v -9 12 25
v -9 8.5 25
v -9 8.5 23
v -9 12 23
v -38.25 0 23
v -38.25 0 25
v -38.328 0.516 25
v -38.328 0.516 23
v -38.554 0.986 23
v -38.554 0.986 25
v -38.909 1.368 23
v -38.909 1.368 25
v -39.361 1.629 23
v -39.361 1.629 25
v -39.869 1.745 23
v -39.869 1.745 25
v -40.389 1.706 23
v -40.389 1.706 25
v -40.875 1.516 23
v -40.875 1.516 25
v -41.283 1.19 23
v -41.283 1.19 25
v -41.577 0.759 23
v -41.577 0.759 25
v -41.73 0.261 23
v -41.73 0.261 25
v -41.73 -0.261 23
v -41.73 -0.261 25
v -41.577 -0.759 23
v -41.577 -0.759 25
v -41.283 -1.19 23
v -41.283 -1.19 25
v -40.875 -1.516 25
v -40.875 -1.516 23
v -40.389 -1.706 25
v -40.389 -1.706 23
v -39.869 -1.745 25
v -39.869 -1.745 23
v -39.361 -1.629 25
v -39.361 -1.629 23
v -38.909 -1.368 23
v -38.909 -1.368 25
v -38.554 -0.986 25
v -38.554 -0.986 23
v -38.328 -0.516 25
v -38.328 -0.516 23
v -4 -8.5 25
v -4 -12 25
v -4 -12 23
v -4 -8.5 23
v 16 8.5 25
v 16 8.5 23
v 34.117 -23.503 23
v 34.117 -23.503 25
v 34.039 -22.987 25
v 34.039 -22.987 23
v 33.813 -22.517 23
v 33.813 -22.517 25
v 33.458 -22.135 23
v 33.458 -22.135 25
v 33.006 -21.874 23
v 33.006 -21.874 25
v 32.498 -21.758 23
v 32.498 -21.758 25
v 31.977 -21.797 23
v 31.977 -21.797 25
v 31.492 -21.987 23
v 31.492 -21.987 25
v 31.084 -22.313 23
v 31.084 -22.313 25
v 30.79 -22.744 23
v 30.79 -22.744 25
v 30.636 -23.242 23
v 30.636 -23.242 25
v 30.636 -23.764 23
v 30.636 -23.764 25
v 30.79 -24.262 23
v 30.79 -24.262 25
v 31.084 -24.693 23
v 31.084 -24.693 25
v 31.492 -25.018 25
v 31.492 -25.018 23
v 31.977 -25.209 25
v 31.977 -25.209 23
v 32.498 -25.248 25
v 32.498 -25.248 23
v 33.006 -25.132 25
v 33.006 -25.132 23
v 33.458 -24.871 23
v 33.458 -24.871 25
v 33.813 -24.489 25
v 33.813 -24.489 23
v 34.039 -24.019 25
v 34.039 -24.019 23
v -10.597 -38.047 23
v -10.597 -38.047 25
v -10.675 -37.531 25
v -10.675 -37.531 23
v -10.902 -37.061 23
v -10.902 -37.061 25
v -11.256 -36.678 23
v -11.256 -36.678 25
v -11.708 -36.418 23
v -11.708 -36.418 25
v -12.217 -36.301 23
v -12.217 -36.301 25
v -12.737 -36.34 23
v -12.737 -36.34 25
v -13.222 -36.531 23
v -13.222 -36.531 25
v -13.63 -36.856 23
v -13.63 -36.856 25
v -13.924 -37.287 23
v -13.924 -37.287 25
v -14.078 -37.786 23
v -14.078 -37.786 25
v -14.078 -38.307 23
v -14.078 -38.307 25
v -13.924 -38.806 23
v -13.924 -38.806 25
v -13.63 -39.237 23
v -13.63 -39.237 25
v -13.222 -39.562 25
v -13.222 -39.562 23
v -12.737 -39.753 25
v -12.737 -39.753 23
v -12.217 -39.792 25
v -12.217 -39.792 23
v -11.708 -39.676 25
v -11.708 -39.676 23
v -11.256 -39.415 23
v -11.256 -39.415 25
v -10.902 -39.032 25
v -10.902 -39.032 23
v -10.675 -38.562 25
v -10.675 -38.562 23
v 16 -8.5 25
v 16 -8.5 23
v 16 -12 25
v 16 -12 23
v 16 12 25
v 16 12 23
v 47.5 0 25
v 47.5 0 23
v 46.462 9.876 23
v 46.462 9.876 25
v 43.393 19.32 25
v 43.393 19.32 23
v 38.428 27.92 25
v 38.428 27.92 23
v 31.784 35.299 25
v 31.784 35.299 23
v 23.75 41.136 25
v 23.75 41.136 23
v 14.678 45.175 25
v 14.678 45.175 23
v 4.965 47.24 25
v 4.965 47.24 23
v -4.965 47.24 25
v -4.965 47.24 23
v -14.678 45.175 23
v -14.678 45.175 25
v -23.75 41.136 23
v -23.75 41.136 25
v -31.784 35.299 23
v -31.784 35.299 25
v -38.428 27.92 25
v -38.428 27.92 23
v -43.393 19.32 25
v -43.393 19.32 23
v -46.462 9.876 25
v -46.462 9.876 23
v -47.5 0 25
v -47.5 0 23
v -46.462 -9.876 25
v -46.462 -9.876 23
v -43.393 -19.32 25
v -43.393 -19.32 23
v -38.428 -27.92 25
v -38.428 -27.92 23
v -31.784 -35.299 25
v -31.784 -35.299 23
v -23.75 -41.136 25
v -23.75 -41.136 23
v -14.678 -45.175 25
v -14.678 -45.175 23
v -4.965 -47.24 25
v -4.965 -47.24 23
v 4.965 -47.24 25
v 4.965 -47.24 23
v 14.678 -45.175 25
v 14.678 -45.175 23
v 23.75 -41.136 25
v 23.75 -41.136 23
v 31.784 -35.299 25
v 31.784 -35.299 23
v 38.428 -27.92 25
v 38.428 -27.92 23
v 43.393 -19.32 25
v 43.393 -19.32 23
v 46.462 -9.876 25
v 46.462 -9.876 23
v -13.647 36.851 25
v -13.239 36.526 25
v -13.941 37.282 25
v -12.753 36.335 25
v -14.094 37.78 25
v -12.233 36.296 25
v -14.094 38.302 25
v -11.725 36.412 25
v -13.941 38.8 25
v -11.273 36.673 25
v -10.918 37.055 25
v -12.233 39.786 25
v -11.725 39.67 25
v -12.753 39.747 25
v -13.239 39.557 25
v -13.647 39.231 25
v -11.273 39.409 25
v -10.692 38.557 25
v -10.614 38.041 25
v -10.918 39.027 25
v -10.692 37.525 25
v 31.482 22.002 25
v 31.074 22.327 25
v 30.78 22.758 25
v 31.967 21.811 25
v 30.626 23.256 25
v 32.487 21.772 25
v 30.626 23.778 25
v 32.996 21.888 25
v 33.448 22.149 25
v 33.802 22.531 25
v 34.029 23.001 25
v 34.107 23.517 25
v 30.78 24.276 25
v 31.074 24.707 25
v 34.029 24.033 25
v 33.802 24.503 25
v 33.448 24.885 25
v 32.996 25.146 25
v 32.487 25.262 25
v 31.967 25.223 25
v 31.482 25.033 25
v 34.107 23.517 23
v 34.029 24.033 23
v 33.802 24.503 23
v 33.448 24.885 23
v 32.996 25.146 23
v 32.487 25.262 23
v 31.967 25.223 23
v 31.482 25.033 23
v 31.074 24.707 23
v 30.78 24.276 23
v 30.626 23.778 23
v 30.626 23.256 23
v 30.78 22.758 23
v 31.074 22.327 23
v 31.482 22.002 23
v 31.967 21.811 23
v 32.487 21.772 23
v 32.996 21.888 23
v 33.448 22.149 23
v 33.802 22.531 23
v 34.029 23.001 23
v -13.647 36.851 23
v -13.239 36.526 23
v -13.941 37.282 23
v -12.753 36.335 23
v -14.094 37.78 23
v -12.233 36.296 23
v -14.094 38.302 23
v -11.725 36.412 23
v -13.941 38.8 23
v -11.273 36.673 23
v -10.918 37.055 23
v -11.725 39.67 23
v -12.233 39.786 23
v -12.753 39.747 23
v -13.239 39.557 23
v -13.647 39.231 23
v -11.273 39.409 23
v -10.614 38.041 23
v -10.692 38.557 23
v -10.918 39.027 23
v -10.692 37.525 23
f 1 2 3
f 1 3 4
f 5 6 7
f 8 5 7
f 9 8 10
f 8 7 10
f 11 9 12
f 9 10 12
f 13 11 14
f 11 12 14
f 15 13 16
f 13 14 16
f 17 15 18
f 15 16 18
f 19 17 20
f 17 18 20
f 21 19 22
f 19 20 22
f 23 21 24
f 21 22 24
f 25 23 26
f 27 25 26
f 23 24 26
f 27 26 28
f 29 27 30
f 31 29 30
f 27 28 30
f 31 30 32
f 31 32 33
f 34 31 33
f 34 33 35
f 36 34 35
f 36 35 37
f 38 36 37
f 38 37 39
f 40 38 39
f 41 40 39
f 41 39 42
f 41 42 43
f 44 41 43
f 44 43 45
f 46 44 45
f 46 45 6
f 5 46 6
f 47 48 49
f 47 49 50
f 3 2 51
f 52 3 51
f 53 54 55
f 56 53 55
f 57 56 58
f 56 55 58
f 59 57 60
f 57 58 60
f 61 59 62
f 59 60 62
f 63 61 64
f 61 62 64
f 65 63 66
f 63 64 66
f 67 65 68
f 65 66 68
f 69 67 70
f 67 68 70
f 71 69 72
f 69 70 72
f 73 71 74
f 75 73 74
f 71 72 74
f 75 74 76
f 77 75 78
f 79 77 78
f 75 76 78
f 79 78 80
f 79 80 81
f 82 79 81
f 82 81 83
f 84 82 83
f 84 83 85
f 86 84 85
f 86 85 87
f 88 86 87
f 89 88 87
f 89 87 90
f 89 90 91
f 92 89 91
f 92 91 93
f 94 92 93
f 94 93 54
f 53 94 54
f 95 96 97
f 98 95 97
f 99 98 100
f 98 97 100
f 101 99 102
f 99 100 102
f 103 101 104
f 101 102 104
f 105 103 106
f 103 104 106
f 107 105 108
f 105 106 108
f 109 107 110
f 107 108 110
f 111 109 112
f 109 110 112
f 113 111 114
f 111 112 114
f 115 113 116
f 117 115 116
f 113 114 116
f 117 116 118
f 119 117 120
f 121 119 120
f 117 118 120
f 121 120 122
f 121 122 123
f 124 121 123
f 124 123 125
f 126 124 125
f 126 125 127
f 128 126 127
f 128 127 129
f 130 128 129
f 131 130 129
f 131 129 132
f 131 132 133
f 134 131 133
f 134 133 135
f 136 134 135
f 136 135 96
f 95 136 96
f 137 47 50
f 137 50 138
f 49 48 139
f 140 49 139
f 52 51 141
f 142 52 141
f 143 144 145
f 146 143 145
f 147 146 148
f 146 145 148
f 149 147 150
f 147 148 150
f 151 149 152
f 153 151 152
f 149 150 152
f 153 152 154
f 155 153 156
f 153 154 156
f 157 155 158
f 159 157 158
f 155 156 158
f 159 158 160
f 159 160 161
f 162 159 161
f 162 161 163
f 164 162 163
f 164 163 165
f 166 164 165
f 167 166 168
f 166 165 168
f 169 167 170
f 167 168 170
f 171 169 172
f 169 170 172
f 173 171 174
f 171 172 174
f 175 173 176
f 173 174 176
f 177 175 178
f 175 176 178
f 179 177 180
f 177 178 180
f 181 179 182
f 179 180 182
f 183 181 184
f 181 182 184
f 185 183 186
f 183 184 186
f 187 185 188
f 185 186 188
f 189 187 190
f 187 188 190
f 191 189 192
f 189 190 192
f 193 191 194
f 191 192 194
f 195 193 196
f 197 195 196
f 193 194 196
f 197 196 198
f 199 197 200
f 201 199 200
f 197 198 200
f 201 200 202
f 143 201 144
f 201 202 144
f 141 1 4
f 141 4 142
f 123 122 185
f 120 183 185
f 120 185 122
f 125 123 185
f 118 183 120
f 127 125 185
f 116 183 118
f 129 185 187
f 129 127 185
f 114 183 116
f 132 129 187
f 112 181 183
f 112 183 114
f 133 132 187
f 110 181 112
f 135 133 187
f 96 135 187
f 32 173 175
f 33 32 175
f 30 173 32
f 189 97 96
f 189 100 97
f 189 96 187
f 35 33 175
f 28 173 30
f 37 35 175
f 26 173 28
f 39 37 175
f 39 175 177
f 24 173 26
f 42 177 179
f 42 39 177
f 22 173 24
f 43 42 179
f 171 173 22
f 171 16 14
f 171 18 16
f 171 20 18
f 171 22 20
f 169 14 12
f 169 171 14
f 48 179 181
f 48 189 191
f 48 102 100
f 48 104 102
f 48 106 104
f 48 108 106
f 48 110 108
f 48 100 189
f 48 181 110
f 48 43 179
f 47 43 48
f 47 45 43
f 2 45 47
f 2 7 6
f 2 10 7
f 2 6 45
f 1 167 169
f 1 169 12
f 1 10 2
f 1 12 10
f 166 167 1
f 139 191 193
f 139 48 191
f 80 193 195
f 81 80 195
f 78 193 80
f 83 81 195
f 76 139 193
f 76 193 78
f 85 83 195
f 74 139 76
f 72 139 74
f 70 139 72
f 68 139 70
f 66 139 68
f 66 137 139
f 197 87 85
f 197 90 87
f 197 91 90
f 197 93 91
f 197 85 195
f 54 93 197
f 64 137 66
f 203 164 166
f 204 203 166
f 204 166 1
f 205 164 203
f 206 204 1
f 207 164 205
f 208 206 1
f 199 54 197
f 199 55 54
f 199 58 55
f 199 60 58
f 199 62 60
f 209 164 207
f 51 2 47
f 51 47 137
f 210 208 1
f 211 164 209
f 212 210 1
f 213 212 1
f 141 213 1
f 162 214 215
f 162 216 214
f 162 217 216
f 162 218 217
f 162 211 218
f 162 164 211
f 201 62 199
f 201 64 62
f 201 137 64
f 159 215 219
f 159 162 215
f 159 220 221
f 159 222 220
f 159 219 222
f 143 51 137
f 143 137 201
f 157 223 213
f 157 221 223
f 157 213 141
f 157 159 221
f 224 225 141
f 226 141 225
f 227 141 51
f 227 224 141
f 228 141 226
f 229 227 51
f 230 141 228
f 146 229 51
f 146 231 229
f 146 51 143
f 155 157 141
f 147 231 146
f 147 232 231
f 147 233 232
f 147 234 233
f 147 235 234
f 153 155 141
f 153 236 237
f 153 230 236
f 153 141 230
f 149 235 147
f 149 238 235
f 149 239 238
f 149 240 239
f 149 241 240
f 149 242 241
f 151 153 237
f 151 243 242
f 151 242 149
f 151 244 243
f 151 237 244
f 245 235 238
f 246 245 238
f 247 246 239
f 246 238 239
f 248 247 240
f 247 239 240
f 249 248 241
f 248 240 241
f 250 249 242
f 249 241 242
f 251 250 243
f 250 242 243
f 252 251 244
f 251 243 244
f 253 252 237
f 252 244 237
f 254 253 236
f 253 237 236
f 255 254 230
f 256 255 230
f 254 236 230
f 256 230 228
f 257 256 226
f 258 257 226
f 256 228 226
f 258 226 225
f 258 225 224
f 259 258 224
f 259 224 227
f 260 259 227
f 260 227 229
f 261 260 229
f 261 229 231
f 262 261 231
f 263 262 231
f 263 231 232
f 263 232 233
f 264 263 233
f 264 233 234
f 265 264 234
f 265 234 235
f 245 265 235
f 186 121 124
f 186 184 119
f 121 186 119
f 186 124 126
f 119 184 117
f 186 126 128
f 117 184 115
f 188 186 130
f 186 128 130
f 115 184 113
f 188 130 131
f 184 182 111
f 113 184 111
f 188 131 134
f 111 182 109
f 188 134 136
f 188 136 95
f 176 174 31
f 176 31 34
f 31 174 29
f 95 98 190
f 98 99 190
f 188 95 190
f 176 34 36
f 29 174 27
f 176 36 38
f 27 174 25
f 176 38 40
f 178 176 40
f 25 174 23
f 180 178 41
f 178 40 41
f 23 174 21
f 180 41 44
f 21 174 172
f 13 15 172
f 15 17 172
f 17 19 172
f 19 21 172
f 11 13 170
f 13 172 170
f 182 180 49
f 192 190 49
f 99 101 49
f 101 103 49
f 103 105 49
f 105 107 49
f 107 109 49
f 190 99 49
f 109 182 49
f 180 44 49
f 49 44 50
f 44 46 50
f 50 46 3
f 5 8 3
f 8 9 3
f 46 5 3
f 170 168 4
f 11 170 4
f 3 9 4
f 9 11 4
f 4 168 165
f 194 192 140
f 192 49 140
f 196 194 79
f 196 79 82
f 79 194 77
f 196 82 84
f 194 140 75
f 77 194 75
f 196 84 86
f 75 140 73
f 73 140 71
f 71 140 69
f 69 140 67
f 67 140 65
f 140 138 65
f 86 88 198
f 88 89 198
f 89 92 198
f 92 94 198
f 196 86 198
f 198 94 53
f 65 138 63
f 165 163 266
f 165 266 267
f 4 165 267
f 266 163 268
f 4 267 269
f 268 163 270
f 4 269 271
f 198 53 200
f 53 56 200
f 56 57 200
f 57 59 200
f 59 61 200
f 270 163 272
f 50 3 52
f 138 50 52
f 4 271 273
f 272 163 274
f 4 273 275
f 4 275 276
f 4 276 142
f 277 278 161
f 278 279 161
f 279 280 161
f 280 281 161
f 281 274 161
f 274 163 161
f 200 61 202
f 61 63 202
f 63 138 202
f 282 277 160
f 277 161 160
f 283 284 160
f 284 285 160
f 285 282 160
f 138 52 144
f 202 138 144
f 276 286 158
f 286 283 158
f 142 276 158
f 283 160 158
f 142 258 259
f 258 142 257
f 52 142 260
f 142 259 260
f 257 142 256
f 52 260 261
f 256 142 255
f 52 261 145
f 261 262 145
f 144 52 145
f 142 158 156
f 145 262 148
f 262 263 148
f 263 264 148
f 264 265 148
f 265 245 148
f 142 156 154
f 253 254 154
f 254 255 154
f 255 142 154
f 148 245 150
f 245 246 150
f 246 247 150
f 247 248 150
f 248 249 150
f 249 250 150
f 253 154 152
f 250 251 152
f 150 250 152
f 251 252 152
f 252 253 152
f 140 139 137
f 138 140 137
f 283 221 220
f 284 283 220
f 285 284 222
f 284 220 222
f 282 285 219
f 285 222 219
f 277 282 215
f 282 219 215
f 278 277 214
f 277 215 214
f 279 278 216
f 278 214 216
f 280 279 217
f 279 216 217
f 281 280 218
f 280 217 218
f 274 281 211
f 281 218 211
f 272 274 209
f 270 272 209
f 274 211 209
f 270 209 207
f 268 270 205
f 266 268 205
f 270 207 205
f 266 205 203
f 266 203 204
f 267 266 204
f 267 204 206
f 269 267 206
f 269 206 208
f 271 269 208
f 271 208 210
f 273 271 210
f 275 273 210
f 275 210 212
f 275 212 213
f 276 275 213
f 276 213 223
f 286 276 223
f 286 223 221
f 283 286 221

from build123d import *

# Parameters (mm, degrees)
SKETCH003_R     = 47.5
PAD001_DEPTH    = 2
SKETCH012_R     = 1.75
POCKET005_DEPTH = 5
SKETCH021_W     = 25
SKETCH021_H     = 3.5
SKETCH021_W_2   = 20
POCKET013_DEPTH = 5


with BuildPart() as part:
    # Sketch003 → Pad001 (new body)
    with BuildSketch(Plane.XY):
        Circle(SKETCH003_R)
    extrude(amount=PAD001_DEPTH)

    # Sketch012 (on Face3 of Pad001) → Pocket005 (cut)
    with BuildSketch(Plane.XY.offset(2)):
        with Locations((-12.363995, 38.041183)):
            Circle(SKETCH012_R)
        with Locations((-12.347418, -38.046567)):
            Circle(SKETCH012_R)
        with Locations((-40, 0)):
            Circle(SKETCH012_R)
        with Locations((32.356581, 23.51705)):
            Circle(SKETCH012_R)
        with Locations((32.366826, -23.502949)):
            Circle(SKETCH012_R)
    extrude(amount=-POCKET005_DEPTH, mode=Mode.SUBTRACT)

    # Sketch021 (on Face3 of Pocket005) → Pocket013 (cut)
    with BuildSketch(Plane.XY.offset(2)):
        with Locations((3.5, 10.25)):
            Rectangle(SKETCH021_W, SKETCH021_H)
        with Locations((6, -10.25)):
            Rectangle(SKETCH021_W_2, SKETCH021_H)
    extrude(amount=-POCKET013_DEPTH, mode=Mode.SUBTRACT)


with BuildPart() as part_1:
    # Body001 placement: moved
    add(part.part.moved(Location((0, 0, 23))))


solid = part_1.part
